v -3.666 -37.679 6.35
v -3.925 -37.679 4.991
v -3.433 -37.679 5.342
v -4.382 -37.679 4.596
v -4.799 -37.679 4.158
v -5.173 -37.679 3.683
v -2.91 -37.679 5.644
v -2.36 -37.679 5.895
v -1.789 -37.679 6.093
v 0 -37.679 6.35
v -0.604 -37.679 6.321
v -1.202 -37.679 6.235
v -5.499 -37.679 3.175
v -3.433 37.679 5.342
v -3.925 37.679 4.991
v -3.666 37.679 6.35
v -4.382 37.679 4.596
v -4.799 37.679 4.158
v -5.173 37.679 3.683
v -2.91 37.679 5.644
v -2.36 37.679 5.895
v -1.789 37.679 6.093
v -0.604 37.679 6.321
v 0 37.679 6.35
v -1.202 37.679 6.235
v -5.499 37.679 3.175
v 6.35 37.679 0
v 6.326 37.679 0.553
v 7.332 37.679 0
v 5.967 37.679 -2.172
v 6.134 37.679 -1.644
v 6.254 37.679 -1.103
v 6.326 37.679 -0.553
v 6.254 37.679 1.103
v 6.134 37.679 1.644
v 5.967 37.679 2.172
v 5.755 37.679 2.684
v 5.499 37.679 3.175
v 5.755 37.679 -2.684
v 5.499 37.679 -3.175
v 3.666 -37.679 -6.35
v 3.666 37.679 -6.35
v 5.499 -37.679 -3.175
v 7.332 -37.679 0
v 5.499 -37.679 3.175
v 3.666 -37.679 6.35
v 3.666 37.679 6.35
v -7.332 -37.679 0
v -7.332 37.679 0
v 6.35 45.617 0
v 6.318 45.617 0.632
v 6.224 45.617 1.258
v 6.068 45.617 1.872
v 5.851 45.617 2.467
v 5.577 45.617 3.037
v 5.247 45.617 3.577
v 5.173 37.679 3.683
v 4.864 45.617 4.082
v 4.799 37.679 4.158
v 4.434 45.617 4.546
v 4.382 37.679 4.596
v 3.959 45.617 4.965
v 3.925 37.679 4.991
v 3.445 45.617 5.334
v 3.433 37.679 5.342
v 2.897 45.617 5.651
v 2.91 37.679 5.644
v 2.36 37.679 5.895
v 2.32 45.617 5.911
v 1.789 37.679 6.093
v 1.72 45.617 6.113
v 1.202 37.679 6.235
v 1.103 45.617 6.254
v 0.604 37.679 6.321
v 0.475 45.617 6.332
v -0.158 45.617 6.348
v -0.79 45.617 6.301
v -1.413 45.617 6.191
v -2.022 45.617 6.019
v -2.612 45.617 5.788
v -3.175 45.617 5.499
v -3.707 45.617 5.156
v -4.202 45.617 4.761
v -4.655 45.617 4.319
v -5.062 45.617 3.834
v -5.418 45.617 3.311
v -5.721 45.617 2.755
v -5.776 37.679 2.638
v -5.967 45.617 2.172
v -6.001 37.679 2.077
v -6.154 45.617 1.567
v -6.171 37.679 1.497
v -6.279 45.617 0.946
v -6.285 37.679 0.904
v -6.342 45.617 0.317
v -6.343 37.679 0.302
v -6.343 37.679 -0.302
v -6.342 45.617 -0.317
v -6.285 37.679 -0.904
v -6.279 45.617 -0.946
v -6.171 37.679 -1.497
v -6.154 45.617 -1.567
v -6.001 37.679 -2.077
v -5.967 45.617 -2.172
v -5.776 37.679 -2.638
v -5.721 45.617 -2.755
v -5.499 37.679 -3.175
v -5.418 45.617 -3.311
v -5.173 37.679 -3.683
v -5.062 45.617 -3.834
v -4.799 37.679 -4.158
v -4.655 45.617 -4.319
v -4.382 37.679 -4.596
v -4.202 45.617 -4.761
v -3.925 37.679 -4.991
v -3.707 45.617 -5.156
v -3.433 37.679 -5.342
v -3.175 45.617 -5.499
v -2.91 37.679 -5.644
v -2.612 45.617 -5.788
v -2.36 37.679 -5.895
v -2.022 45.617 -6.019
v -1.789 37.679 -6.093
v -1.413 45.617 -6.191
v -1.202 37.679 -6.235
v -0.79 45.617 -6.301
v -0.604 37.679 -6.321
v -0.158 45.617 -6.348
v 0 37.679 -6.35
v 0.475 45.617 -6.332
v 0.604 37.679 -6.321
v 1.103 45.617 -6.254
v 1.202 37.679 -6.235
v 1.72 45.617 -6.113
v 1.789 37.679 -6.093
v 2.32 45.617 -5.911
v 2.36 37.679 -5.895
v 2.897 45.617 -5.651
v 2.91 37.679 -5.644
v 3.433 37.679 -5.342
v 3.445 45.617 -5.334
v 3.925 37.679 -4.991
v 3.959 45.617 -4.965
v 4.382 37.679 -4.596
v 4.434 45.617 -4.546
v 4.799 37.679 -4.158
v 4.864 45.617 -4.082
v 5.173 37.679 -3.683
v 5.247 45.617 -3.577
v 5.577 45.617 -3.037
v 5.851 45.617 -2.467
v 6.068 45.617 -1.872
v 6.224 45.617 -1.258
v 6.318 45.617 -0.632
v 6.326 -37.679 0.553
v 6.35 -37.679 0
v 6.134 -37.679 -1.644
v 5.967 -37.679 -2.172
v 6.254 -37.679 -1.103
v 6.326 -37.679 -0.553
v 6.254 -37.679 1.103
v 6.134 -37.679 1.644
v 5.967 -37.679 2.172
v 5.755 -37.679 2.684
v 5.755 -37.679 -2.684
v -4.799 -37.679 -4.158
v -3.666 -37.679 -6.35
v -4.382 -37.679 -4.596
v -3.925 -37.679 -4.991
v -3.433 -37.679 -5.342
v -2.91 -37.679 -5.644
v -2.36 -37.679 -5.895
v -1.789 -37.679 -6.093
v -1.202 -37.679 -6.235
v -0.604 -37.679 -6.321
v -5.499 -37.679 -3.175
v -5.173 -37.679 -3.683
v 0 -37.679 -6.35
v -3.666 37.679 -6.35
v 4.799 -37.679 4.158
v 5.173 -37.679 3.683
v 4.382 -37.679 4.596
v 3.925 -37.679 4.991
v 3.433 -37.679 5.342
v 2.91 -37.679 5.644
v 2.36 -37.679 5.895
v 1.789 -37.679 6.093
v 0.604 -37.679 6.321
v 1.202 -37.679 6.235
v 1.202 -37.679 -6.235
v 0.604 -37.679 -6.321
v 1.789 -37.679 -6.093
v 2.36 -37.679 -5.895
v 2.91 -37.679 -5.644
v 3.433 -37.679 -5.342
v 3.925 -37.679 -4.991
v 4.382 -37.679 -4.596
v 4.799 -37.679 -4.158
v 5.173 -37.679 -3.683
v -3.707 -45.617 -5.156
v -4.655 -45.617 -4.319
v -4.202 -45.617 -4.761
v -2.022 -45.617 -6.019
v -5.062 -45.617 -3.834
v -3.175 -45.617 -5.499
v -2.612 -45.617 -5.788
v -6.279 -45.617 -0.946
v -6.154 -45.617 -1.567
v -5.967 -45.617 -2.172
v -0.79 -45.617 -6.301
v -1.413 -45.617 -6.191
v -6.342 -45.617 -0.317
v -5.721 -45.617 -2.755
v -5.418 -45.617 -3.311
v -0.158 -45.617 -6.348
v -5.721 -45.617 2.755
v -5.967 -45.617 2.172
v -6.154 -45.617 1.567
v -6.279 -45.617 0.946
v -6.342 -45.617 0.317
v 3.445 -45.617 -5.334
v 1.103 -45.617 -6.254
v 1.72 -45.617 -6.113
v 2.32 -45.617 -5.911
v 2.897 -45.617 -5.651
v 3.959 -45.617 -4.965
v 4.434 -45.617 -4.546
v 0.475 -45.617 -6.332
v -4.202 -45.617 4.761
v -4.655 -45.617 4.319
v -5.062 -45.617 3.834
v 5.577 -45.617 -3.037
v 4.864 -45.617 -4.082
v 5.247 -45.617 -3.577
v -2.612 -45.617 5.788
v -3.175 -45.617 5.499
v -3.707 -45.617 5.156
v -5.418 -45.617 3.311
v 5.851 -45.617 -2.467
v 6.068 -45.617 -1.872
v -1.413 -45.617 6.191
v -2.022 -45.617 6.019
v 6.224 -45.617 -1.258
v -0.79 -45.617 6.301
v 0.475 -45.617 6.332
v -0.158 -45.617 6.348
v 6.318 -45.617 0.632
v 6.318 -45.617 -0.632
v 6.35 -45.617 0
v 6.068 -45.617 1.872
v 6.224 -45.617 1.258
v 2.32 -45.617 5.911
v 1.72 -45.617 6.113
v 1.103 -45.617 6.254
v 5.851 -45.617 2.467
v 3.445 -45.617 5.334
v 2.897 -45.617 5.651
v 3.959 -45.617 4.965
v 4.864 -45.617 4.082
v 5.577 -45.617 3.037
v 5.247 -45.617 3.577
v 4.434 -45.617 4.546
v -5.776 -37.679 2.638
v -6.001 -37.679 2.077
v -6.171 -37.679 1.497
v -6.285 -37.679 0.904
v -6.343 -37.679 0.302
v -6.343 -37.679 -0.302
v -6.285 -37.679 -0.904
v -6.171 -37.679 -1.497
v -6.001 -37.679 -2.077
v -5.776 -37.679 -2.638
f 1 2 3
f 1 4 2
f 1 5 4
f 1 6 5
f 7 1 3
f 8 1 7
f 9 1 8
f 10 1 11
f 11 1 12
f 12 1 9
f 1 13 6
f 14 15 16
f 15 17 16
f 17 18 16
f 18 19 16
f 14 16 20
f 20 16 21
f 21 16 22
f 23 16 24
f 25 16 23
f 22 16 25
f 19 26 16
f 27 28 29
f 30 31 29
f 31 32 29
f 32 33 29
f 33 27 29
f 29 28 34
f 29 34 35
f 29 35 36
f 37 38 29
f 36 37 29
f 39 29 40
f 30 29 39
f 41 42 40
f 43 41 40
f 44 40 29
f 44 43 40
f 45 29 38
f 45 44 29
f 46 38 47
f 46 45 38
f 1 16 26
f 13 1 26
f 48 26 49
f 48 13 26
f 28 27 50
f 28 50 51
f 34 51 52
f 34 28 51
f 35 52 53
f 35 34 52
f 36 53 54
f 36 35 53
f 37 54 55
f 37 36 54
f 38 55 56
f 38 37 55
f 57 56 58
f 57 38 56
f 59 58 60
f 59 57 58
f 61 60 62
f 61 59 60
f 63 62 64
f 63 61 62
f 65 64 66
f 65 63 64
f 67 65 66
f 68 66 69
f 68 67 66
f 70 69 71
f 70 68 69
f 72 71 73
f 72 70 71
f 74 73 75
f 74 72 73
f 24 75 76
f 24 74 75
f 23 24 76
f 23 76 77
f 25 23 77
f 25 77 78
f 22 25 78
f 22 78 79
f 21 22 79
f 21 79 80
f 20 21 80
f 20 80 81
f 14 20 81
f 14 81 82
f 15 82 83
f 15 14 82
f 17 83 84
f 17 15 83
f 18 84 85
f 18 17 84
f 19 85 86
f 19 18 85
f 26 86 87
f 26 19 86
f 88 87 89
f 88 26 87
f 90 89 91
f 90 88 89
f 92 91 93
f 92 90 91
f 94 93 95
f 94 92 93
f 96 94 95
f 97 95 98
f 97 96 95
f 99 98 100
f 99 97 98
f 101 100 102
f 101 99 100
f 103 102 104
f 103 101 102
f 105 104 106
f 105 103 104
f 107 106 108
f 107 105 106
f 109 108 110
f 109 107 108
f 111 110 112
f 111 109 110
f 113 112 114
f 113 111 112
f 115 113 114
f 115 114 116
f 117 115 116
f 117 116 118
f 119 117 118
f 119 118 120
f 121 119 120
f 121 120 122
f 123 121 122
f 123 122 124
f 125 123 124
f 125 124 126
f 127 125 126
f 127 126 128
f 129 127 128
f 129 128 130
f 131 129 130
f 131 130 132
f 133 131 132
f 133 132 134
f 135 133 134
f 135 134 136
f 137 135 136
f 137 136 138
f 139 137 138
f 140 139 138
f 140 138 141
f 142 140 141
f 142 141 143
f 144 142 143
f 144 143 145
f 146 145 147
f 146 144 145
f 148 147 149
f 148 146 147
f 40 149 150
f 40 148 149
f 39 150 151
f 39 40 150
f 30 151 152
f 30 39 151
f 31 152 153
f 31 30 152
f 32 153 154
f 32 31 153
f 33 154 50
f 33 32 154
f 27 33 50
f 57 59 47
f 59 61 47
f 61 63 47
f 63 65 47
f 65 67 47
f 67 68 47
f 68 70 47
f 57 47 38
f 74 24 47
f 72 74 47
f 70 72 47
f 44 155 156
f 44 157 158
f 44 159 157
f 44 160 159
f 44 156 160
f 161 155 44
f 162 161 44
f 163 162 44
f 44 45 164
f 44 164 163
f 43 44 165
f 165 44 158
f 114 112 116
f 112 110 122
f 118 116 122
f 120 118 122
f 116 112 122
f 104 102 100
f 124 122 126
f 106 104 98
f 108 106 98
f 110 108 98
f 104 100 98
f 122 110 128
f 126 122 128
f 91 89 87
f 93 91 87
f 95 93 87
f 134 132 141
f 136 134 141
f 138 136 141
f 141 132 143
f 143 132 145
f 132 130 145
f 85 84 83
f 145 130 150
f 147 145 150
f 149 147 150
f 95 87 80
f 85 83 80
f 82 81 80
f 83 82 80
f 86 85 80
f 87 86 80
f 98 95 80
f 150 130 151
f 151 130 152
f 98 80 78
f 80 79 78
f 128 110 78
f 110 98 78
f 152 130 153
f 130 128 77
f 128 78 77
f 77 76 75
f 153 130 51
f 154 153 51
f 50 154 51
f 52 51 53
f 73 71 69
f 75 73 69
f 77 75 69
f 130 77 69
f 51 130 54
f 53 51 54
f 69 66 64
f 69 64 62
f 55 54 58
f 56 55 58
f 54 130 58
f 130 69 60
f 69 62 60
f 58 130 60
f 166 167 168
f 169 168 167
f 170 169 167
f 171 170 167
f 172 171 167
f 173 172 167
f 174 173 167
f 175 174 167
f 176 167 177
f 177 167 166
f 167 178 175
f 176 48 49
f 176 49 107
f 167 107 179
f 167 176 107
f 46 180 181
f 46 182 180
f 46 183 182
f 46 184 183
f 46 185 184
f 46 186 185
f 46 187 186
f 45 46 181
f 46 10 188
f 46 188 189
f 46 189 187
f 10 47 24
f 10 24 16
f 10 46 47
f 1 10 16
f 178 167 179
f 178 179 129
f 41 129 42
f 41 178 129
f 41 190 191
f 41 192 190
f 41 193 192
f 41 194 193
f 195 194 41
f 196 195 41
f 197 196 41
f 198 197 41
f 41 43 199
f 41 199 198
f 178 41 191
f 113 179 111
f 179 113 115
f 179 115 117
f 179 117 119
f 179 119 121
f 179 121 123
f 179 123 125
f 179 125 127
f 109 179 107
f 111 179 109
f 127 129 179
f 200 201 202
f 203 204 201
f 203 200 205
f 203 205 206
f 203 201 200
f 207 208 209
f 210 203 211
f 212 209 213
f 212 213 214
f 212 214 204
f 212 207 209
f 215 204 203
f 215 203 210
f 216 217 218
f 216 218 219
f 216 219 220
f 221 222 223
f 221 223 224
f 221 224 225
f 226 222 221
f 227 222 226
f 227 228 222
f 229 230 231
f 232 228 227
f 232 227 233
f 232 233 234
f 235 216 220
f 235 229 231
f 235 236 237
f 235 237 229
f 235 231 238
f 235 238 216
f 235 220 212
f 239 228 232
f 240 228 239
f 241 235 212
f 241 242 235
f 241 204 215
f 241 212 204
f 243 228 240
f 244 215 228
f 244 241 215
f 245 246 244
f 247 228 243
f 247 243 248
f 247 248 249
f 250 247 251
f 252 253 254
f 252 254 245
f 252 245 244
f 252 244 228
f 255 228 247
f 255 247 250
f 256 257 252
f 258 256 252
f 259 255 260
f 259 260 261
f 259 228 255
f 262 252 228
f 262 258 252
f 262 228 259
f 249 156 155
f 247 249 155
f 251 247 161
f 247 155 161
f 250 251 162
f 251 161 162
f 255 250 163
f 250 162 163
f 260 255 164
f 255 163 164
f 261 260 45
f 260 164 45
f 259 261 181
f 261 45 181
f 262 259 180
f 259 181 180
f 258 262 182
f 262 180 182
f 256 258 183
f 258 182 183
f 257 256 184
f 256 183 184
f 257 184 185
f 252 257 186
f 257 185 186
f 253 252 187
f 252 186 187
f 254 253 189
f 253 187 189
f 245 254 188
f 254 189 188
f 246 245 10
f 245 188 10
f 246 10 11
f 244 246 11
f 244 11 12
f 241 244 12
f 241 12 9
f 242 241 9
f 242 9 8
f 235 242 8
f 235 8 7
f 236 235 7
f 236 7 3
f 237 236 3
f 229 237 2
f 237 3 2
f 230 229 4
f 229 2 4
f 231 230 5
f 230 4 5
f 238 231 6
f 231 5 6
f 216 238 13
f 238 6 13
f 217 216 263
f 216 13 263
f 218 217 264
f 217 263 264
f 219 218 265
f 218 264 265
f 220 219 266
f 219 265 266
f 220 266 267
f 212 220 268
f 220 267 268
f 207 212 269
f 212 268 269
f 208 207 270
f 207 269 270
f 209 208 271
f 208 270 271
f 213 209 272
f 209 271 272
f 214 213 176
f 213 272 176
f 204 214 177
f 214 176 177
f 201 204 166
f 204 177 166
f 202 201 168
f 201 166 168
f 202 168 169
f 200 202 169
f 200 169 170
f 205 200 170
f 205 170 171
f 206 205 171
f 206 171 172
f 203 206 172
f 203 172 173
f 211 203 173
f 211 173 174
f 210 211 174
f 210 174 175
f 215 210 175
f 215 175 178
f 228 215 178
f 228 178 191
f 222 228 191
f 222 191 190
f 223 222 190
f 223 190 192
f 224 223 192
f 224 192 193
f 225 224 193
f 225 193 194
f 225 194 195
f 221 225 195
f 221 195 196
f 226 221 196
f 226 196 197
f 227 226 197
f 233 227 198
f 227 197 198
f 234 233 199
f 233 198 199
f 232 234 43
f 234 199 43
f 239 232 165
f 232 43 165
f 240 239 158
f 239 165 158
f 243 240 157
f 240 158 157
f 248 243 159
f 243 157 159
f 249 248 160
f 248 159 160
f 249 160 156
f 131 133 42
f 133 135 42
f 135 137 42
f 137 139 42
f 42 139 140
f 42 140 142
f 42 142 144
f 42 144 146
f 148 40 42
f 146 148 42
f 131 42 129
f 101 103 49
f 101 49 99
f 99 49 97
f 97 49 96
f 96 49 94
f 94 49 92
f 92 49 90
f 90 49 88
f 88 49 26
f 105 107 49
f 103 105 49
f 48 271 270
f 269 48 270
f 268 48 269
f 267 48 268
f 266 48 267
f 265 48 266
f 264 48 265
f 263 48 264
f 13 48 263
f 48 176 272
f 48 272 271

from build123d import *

# Parameters (mm, degrees)
F1_DEPTH = 37.6793125
F2_R     = 6.35
F3_DEPTH = 7.9375


# Not quite as in the source:
# - a pattern or mirror of a feature is missing from the dataset's text; its kind, count and spacing are read off the source's solid


with BuildPart() as f1:
    # F0 (on Front) → F1 (new body, symmetric)
    with BuildSketch(Plane.XZ):
        Polygon((3.6661742094, 6.35), (-3.6661742094, 6.35), (-7.3323484187, 0), (-3.6661742094, -6.35), (3.6661742094, -6.35), (7.3323484187, 0), align=None)
    extrude(amount=F1_DEPTH, both=True)

    # F2 (on face) → F3 (join)
    with BuildSketch(Plane.XZ.offset(37.6793125)):
        Circle(F2_R)
    f3 = extrude(amount=F3_DEPTH)

    # F3_copies: F3 across plane
    add(f3.mirror(Plane.ZX))


solid = f1.part
